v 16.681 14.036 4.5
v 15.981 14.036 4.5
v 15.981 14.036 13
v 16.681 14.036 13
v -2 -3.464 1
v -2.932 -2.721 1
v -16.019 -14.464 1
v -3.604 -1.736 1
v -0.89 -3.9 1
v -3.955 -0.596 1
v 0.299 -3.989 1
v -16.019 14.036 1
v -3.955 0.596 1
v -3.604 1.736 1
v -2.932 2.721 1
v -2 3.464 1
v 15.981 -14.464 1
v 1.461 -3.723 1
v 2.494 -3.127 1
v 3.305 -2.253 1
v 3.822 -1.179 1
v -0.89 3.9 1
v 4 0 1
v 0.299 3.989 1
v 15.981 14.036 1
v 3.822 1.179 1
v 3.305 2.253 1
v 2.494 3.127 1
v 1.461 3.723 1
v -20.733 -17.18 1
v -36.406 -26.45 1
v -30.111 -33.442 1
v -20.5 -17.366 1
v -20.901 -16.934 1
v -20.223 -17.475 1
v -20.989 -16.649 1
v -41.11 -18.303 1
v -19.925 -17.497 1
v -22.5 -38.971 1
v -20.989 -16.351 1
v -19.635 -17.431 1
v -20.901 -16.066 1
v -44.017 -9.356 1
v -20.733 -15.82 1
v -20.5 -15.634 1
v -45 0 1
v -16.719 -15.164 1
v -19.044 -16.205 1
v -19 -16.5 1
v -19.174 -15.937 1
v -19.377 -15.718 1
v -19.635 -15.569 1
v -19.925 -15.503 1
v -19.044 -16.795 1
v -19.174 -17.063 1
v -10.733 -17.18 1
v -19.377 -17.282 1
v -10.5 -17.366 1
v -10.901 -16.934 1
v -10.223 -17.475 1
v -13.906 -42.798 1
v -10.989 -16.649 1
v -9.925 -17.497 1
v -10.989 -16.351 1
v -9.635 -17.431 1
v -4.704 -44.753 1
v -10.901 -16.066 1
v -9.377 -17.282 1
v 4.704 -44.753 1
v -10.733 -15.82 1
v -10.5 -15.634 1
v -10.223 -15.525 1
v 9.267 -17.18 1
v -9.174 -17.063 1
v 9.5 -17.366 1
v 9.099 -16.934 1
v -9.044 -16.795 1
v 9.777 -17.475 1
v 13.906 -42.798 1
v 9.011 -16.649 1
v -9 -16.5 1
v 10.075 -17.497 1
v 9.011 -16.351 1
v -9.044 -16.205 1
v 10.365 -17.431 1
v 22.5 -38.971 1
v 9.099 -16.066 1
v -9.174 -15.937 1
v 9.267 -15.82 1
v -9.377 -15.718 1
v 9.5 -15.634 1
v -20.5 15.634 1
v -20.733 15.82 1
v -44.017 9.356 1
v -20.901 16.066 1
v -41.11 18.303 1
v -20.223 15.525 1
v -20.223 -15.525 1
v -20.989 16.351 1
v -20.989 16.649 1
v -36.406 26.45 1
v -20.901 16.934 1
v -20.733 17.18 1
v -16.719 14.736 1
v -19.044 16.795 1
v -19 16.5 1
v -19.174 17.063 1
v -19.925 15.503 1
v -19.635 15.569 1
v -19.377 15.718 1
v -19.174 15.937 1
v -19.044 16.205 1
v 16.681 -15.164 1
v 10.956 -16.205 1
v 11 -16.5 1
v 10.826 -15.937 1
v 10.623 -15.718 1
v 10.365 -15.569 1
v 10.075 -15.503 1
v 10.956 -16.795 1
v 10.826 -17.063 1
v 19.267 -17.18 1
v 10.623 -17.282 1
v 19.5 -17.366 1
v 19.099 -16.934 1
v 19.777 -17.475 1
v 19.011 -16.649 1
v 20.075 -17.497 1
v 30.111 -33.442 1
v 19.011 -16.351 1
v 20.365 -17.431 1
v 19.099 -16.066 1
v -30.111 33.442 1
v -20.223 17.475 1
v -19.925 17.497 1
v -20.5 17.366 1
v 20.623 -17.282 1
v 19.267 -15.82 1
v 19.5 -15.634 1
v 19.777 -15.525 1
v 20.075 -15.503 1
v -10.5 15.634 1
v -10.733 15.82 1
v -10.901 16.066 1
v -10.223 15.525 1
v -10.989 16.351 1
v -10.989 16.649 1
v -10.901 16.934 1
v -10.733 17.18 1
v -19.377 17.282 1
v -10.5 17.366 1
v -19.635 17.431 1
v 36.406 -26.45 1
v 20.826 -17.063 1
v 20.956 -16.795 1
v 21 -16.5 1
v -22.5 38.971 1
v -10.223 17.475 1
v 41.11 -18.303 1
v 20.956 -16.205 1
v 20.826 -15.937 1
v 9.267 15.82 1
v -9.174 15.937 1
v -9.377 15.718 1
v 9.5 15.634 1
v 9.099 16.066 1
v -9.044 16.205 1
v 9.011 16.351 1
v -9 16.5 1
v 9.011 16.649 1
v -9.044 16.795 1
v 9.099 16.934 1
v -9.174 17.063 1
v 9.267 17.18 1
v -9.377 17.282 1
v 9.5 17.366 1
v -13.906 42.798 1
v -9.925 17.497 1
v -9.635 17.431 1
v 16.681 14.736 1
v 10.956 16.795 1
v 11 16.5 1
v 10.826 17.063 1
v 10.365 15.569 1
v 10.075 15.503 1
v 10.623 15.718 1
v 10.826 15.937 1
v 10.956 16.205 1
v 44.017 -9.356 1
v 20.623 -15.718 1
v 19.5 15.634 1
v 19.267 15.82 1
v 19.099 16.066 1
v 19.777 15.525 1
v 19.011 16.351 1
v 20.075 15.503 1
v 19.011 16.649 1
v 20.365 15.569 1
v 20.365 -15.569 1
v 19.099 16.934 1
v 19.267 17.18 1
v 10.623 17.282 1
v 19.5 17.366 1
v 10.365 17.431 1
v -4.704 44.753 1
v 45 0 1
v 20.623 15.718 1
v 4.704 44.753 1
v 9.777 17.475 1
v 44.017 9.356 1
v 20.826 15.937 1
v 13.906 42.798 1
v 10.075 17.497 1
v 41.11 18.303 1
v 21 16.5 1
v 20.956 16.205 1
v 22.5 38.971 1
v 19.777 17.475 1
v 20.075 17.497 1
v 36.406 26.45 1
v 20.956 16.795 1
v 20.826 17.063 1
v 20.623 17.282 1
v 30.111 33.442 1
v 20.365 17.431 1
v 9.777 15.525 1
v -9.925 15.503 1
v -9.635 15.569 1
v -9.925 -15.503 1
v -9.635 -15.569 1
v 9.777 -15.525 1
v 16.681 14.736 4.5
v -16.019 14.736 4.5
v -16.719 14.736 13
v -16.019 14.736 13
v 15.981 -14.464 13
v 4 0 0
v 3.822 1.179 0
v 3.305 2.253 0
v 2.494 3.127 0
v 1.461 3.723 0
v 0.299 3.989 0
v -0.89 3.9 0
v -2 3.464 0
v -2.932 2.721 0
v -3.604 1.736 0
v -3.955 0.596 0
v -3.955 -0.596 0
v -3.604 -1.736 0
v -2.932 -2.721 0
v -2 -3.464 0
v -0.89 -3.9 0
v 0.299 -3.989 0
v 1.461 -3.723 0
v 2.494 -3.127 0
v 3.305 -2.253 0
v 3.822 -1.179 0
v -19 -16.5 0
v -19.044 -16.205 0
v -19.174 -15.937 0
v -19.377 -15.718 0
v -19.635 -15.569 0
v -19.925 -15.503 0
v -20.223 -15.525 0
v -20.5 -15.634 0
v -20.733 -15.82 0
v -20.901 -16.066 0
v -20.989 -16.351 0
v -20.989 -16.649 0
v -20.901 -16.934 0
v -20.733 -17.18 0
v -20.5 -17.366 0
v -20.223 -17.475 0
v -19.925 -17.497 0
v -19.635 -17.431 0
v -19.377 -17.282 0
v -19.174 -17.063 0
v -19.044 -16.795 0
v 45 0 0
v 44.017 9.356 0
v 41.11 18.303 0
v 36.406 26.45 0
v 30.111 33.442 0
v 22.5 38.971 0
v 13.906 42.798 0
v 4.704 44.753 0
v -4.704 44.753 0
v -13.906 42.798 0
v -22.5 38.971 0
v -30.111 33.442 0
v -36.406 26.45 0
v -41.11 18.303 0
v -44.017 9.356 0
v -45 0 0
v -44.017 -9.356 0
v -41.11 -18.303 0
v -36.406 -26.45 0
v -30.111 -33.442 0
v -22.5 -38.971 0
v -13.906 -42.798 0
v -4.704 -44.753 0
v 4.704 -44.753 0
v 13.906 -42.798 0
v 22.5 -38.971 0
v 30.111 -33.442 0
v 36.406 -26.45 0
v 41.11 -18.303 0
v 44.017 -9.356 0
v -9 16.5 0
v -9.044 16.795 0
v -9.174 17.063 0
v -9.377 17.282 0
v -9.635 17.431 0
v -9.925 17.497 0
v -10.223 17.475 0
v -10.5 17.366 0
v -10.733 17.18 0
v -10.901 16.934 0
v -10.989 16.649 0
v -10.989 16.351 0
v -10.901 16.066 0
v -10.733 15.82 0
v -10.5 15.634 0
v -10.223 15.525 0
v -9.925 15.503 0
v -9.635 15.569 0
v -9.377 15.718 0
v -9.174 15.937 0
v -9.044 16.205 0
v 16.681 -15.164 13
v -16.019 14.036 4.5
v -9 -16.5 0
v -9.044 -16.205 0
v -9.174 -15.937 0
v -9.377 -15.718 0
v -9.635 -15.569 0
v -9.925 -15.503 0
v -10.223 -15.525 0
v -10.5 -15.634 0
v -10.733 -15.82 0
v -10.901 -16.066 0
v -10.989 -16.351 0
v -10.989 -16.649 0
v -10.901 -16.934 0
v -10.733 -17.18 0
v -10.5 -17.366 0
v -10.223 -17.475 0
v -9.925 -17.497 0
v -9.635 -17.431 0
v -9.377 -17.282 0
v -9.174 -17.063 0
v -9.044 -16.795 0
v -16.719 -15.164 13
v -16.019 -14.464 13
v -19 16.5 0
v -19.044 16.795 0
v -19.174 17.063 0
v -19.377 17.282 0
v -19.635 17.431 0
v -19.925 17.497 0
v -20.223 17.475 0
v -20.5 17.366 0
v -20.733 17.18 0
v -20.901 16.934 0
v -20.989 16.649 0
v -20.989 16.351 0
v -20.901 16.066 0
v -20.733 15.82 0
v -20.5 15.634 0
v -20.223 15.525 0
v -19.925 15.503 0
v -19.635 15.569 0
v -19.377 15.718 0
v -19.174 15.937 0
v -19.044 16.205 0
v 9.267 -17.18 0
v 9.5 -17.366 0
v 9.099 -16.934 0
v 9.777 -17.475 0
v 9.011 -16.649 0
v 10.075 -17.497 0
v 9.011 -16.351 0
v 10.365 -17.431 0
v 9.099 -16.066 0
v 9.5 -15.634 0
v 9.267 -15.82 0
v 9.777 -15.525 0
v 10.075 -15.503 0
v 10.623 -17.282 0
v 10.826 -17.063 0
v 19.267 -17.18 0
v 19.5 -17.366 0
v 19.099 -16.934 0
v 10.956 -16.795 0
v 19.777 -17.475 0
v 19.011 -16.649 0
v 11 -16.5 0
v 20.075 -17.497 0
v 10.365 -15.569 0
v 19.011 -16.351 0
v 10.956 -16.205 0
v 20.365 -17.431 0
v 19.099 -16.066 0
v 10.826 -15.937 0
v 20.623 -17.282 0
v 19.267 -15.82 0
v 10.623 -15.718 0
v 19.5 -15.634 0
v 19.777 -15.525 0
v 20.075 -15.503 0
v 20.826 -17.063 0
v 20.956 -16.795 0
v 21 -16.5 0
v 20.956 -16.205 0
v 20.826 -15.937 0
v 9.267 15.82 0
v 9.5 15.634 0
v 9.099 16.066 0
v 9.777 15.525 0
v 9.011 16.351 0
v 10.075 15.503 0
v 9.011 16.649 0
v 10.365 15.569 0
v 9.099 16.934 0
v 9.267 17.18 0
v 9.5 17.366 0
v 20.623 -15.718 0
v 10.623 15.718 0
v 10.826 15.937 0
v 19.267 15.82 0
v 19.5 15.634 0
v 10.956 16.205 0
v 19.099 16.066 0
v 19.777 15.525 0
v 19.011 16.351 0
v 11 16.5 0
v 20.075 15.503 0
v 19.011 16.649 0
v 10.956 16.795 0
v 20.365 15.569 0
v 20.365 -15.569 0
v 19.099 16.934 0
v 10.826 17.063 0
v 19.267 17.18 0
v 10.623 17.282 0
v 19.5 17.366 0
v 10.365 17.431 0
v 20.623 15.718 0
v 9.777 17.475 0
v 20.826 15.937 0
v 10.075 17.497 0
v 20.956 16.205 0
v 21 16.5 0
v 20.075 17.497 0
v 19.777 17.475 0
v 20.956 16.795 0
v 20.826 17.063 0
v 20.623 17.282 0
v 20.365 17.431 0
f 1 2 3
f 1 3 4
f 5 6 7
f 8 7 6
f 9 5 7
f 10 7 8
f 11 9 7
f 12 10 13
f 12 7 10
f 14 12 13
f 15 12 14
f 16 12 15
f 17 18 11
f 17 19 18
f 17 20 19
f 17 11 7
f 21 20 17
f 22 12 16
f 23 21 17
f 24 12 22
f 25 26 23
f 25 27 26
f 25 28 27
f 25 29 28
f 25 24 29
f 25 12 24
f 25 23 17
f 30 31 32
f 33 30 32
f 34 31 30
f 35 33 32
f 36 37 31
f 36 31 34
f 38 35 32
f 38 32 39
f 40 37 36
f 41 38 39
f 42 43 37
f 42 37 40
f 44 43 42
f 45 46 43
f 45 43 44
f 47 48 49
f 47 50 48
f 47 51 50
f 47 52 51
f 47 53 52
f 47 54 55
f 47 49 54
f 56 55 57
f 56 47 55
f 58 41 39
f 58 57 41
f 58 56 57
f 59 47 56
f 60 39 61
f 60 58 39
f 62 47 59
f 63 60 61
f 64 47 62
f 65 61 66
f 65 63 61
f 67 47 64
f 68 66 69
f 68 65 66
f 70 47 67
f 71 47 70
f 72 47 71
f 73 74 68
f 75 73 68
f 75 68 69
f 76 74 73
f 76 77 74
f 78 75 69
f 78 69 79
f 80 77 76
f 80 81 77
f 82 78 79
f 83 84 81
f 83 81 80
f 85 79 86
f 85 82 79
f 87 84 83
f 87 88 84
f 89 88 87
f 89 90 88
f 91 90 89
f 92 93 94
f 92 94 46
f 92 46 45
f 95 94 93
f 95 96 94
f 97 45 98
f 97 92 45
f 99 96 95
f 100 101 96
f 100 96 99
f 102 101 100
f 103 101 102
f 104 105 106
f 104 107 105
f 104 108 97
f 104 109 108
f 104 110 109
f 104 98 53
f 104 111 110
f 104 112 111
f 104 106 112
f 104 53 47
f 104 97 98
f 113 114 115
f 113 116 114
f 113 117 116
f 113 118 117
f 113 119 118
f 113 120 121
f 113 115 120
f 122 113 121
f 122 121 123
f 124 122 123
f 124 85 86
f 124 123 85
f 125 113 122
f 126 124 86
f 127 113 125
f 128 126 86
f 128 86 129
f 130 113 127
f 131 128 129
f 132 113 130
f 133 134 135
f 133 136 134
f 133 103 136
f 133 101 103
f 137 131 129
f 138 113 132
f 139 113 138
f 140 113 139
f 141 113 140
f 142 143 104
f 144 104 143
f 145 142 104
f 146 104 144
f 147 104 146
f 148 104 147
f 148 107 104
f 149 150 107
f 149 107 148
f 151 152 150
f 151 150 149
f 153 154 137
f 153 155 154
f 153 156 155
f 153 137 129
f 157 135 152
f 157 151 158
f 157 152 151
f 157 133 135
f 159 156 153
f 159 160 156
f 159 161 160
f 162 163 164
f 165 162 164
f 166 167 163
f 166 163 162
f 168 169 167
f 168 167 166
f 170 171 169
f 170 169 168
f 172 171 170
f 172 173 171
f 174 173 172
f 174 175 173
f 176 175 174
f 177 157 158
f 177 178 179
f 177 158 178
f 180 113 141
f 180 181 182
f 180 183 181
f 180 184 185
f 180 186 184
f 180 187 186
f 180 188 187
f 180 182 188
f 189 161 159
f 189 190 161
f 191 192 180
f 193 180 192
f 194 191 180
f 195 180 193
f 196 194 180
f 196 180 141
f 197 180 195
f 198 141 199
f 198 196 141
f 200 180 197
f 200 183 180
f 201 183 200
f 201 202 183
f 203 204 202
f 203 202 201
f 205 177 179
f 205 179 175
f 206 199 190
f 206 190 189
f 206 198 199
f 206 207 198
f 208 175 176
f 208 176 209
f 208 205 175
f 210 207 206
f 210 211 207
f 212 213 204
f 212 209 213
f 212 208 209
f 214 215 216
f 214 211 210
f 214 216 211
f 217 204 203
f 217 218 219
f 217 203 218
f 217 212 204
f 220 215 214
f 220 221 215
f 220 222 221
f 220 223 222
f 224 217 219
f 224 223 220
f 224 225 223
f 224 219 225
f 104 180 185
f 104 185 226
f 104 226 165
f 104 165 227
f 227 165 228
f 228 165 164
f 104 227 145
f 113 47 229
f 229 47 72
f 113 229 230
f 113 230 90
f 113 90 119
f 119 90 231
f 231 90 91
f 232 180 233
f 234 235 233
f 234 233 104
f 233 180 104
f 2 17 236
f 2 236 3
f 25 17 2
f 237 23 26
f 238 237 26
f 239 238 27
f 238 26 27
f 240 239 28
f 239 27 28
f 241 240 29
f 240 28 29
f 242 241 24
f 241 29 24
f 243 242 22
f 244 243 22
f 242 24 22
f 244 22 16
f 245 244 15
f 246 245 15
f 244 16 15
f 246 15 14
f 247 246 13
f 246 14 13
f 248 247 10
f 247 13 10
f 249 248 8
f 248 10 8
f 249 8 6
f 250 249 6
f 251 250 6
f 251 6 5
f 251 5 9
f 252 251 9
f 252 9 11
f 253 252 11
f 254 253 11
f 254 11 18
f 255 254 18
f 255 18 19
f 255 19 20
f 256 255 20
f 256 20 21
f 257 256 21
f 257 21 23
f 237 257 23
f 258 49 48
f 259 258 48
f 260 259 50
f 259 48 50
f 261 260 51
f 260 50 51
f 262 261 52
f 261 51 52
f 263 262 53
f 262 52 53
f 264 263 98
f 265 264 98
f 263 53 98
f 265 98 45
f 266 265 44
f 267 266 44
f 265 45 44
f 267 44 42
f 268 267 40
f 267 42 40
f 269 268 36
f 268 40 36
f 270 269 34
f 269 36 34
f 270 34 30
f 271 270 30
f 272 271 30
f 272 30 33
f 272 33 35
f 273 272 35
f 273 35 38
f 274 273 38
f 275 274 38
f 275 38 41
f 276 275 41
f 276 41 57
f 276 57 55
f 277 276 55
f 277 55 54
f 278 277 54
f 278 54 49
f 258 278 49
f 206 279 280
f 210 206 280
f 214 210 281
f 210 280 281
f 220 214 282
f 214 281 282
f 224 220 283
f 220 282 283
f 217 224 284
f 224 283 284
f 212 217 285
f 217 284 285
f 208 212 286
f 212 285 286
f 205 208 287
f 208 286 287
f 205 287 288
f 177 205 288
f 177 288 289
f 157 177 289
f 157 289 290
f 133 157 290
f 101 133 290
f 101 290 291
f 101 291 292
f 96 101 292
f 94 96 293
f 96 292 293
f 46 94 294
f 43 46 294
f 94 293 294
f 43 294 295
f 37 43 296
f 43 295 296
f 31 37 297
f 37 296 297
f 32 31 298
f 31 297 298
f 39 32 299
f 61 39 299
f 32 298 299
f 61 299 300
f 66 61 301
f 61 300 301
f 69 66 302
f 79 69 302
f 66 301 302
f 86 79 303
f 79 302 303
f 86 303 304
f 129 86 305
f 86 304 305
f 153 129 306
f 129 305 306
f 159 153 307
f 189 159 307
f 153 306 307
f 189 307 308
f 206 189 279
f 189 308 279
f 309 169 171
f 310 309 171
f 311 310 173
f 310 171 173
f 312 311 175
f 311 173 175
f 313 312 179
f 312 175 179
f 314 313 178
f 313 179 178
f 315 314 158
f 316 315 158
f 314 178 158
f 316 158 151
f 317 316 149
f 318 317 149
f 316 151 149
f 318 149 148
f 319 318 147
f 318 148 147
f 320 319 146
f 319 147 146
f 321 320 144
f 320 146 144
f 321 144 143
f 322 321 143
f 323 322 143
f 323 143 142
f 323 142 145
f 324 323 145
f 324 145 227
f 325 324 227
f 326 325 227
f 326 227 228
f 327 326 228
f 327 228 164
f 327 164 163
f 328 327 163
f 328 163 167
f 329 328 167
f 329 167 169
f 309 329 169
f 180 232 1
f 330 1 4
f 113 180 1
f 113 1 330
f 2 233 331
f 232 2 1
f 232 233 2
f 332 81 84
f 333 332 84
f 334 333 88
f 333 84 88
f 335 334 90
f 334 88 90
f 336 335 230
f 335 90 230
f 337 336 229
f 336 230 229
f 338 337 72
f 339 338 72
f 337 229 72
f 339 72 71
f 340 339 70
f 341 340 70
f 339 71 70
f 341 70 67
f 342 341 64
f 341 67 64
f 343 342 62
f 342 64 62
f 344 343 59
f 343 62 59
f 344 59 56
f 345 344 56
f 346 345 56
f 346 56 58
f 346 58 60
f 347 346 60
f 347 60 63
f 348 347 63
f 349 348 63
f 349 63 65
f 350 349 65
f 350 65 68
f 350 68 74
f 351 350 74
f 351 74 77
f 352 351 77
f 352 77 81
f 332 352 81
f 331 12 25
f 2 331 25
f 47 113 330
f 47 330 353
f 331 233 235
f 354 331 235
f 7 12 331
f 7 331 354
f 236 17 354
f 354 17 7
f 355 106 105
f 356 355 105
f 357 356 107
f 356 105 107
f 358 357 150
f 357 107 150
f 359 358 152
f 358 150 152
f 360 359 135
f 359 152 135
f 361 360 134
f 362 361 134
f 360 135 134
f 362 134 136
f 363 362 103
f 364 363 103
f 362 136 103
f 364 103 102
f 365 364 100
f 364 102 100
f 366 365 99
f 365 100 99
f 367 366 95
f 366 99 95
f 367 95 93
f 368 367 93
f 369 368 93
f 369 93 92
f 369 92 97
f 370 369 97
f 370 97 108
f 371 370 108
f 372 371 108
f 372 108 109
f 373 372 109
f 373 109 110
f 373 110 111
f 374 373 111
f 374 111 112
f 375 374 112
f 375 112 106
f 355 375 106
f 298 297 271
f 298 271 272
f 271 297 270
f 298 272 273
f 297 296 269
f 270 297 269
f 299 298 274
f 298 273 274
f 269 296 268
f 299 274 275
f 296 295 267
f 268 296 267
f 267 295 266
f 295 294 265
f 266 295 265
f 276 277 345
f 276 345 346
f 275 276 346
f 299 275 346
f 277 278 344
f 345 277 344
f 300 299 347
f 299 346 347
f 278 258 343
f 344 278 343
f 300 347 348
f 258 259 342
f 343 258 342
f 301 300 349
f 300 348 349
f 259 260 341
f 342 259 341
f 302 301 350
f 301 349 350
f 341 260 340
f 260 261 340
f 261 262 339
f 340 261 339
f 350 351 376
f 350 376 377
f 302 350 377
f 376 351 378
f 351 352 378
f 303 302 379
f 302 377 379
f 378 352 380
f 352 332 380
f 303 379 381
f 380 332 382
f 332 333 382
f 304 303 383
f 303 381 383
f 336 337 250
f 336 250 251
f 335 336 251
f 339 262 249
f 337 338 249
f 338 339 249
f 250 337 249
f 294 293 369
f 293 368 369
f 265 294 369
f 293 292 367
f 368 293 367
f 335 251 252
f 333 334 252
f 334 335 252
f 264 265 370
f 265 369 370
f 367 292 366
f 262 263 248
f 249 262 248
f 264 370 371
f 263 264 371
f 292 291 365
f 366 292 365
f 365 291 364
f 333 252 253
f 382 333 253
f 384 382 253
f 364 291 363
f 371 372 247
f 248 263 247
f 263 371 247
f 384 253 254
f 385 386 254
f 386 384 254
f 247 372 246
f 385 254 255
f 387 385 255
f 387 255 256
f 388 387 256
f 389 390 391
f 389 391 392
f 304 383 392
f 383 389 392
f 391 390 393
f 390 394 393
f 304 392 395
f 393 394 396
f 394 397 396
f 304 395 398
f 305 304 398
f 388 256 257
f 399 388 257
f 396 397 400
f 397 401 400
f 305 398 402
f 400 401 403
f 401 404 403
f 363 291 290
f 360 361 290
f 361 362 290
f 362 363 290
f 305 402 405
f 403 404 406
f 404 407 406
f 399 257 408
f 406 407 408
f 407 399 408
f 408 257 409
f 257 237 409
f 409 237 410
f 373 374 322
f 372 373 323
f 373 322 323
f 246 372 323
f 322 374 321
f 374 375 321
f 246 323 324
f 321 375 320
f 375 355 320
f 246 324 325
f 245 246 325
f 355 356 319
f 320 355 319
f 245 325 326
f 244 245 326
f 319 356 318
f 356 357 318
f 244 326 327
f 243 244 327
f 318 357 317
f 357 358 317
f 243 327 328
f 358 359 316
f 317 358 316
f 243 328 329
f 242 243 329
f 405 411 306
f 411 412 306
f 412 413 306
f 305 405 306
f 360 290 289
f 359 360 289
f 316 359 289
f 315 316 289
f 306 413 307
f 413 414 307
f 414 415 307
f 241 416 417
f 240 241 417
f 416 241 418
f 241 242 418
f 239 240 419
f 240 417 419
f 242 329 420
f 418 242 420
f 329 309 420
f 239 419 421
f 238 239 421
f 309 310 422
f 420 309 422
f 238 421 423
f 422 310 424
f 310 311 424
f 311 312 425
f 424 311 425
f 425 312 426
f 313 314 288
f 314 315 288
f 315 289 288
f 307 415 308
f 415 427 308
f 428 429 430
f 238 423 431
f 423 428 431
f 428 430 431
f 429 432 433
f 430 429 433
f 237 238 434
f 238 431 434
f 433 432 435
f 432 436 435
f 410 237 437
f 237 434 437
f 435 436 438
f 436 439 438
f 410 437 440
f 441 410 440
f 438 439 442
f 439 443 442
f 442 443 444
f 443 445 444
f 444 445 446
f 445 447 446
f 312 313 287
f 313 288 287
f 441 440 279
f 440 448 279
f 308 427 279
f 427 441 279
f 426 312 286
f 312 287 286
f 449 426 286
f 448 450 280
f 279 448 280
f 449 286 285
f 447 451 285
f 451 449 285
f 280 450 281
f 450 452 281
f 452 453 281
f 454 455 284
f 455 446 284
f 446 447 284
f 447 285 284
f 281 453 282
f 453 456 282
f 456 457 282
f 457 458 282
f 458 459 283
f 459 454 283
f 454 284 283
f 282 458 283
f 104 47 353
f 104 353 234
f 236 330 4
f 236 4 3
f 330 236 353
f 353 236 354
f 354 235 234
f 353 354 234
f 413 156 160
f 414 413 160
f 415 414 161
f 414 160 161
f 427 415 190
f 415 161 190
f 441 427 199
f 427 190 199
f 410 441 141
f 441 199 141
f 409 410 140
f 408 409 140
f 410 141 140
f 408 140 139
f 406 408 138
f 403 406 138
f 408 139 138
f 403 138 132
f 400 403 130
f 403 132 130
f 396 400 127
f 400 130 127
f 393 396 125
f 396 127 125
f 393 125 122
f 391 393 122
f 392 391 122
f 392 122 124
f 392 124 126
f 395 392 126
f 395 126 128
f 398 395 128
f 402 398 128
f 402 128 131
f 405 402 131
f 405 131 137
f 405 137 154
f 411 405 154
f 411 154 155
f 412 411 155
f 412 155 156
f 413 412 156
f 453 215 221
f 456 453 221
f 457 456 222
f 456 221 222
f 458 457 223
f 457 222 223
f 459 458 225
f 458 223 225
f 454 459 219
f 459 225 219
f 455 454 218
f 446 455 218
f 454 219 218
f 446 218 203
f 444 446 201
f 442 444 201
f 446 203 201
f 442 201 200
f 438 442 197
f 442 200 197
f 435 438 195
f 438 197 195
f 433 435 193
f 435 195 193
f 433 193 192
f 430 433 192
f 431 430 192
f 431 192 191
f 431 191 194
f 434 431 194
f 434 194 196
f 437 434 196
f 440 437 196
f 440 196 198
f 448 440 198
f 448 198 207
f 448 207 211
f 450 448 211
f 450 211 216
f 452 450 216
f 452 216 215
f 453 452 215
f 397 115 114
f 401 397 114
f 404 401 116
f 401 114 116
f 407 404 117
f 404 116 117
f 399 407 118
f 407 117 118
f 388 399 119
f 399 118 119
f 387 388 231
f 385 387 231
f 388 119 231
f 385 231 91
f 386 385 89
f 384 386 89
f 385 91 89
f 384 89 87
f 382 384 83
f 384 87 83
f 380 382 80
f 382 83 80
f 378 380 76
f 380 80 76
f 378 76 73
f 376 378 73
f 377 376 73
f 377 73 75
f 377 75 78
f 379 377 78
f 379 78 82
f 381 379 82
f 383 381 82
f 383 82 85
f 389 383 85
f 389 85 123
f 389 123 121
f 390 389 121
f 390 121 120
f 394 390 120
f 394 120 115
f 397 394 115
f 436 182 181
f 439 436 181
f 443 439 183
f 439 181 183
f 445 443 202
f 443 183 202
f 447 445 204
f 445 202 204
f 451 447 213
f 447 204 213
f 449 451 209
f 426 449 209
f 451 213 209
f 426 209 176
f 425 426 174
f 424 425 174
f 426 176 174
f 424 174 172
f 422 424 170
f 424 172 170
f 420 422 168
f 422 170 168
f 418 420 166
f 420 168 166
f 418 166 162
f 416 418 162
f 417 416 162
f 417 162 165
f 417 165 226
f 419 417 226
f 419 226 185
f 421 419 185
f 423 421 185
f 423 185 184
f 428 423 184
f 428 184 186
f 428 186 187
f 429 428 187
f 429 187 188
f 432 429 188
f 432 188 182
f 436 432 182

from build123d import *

# Parameters (mm, degrees)
SKETCH_1_R          = 45
EXTRUDE_1_DEPTH     = 1
SKETCH_2_R          = 1
CUT_EXTRUDE_1_DEPTH = 64.647466564
SKETCH_4_R          = 4
CUT_EXTRUDE_2_DEPTH = 64.647466564
SKETCH_5_W          = 0.7
SKETCH_5_H          = 28.5
EXTRUDE_2_DEPTH     = 12
EXTRUDE_2_2_DEPTH   = 3.5
EXTRUDE_3_DEPTH     = 12


with BuildPart() as part:
    # 草图1 → 凸台-拉伸1 (new body)
    with BuildSketch(Plane.XY):
        Circle(SKETCH_1_R)
    extrude(amount=EXTRUDE_1_DEPTH)

    # 草图2 → 切除-拉伸1 (cut, through all)
    with BuildSketch(Plane.XY.offset(1)):
        with Locations((20, -16.5)):
            Circle(SKETCH_2_R)
        with Locations((20, 16.5)):
            Circle(SKETCH_2_R)
        with Locations((-20, 16.5)):
            Circle(SKETCH_2_R)
        with Locations((-20, -16.5)):
            Circle(SKETCH_2_R)
        with Locations((10, -16.5)):
            Circle(SKETCH_2_R)
        with Locations((10, 16.5)):
            Circle(SKETCH_2_R)
        with Locations((-10, 16.5)):
            Circle(SKETCH_2_R)
        with Locations((-10, -16.5)):
            Circle(SKETCH_2_R)
    extrude(amount=-CUT_EXTRUDE_1_DEPTH, mode=Mode.SUBTRACT)

    # 草图4 → 切除-拉伸2 (cut, through all)
    with BuildSketch(Plane.XY.offset(1)):
        Circle(SKETCH_4_R)
    extrude(amount=-CUT_EXTRUDE_2_DEPTH, mode=Mode.SUBTRACT)

    # 草图5 → Extrude 2 (add)
    with BuildSketch(Plane.XY.offset(1)):
        with Locations((16.331438859, -0.213782194)):
            Rectangle(SKETCH_5_W, SKETCH_5_H)
    extrude(amount=EXTRUDE_2_DEPTH)

    # 草图9 → Extrude 2 2 (add)
    with BuildSketch(Plane.XY.offset(1)):
        Polygon((16.681438859, 14.736217806), (-16.018561141, 14.736217806), (-16.018561141, 14.036217806), (15.981438859, 14.036217806), (16.681438859, 14.036217806), align=None)
    extrude(amount=EXTRUDE_2_2_DEPTH)

    # 草图10 → 凸台-拉伸3 (add)
    with BuildSketch(Plane.XY.offset(1)):
        Polygon((16.681438859, -14.463782194), (16.681438859, -15.163782194), (-16.718561141, -15.163782194), (-16.718561141, 14.736217806), (-16.018561141, 14.736217806), (-16.018561141, -14.463782194), (15.981438859, -14.463782194), align=None)
    extrude(amount=EXTRUDE_3_DEPTH)


solid = part.part
